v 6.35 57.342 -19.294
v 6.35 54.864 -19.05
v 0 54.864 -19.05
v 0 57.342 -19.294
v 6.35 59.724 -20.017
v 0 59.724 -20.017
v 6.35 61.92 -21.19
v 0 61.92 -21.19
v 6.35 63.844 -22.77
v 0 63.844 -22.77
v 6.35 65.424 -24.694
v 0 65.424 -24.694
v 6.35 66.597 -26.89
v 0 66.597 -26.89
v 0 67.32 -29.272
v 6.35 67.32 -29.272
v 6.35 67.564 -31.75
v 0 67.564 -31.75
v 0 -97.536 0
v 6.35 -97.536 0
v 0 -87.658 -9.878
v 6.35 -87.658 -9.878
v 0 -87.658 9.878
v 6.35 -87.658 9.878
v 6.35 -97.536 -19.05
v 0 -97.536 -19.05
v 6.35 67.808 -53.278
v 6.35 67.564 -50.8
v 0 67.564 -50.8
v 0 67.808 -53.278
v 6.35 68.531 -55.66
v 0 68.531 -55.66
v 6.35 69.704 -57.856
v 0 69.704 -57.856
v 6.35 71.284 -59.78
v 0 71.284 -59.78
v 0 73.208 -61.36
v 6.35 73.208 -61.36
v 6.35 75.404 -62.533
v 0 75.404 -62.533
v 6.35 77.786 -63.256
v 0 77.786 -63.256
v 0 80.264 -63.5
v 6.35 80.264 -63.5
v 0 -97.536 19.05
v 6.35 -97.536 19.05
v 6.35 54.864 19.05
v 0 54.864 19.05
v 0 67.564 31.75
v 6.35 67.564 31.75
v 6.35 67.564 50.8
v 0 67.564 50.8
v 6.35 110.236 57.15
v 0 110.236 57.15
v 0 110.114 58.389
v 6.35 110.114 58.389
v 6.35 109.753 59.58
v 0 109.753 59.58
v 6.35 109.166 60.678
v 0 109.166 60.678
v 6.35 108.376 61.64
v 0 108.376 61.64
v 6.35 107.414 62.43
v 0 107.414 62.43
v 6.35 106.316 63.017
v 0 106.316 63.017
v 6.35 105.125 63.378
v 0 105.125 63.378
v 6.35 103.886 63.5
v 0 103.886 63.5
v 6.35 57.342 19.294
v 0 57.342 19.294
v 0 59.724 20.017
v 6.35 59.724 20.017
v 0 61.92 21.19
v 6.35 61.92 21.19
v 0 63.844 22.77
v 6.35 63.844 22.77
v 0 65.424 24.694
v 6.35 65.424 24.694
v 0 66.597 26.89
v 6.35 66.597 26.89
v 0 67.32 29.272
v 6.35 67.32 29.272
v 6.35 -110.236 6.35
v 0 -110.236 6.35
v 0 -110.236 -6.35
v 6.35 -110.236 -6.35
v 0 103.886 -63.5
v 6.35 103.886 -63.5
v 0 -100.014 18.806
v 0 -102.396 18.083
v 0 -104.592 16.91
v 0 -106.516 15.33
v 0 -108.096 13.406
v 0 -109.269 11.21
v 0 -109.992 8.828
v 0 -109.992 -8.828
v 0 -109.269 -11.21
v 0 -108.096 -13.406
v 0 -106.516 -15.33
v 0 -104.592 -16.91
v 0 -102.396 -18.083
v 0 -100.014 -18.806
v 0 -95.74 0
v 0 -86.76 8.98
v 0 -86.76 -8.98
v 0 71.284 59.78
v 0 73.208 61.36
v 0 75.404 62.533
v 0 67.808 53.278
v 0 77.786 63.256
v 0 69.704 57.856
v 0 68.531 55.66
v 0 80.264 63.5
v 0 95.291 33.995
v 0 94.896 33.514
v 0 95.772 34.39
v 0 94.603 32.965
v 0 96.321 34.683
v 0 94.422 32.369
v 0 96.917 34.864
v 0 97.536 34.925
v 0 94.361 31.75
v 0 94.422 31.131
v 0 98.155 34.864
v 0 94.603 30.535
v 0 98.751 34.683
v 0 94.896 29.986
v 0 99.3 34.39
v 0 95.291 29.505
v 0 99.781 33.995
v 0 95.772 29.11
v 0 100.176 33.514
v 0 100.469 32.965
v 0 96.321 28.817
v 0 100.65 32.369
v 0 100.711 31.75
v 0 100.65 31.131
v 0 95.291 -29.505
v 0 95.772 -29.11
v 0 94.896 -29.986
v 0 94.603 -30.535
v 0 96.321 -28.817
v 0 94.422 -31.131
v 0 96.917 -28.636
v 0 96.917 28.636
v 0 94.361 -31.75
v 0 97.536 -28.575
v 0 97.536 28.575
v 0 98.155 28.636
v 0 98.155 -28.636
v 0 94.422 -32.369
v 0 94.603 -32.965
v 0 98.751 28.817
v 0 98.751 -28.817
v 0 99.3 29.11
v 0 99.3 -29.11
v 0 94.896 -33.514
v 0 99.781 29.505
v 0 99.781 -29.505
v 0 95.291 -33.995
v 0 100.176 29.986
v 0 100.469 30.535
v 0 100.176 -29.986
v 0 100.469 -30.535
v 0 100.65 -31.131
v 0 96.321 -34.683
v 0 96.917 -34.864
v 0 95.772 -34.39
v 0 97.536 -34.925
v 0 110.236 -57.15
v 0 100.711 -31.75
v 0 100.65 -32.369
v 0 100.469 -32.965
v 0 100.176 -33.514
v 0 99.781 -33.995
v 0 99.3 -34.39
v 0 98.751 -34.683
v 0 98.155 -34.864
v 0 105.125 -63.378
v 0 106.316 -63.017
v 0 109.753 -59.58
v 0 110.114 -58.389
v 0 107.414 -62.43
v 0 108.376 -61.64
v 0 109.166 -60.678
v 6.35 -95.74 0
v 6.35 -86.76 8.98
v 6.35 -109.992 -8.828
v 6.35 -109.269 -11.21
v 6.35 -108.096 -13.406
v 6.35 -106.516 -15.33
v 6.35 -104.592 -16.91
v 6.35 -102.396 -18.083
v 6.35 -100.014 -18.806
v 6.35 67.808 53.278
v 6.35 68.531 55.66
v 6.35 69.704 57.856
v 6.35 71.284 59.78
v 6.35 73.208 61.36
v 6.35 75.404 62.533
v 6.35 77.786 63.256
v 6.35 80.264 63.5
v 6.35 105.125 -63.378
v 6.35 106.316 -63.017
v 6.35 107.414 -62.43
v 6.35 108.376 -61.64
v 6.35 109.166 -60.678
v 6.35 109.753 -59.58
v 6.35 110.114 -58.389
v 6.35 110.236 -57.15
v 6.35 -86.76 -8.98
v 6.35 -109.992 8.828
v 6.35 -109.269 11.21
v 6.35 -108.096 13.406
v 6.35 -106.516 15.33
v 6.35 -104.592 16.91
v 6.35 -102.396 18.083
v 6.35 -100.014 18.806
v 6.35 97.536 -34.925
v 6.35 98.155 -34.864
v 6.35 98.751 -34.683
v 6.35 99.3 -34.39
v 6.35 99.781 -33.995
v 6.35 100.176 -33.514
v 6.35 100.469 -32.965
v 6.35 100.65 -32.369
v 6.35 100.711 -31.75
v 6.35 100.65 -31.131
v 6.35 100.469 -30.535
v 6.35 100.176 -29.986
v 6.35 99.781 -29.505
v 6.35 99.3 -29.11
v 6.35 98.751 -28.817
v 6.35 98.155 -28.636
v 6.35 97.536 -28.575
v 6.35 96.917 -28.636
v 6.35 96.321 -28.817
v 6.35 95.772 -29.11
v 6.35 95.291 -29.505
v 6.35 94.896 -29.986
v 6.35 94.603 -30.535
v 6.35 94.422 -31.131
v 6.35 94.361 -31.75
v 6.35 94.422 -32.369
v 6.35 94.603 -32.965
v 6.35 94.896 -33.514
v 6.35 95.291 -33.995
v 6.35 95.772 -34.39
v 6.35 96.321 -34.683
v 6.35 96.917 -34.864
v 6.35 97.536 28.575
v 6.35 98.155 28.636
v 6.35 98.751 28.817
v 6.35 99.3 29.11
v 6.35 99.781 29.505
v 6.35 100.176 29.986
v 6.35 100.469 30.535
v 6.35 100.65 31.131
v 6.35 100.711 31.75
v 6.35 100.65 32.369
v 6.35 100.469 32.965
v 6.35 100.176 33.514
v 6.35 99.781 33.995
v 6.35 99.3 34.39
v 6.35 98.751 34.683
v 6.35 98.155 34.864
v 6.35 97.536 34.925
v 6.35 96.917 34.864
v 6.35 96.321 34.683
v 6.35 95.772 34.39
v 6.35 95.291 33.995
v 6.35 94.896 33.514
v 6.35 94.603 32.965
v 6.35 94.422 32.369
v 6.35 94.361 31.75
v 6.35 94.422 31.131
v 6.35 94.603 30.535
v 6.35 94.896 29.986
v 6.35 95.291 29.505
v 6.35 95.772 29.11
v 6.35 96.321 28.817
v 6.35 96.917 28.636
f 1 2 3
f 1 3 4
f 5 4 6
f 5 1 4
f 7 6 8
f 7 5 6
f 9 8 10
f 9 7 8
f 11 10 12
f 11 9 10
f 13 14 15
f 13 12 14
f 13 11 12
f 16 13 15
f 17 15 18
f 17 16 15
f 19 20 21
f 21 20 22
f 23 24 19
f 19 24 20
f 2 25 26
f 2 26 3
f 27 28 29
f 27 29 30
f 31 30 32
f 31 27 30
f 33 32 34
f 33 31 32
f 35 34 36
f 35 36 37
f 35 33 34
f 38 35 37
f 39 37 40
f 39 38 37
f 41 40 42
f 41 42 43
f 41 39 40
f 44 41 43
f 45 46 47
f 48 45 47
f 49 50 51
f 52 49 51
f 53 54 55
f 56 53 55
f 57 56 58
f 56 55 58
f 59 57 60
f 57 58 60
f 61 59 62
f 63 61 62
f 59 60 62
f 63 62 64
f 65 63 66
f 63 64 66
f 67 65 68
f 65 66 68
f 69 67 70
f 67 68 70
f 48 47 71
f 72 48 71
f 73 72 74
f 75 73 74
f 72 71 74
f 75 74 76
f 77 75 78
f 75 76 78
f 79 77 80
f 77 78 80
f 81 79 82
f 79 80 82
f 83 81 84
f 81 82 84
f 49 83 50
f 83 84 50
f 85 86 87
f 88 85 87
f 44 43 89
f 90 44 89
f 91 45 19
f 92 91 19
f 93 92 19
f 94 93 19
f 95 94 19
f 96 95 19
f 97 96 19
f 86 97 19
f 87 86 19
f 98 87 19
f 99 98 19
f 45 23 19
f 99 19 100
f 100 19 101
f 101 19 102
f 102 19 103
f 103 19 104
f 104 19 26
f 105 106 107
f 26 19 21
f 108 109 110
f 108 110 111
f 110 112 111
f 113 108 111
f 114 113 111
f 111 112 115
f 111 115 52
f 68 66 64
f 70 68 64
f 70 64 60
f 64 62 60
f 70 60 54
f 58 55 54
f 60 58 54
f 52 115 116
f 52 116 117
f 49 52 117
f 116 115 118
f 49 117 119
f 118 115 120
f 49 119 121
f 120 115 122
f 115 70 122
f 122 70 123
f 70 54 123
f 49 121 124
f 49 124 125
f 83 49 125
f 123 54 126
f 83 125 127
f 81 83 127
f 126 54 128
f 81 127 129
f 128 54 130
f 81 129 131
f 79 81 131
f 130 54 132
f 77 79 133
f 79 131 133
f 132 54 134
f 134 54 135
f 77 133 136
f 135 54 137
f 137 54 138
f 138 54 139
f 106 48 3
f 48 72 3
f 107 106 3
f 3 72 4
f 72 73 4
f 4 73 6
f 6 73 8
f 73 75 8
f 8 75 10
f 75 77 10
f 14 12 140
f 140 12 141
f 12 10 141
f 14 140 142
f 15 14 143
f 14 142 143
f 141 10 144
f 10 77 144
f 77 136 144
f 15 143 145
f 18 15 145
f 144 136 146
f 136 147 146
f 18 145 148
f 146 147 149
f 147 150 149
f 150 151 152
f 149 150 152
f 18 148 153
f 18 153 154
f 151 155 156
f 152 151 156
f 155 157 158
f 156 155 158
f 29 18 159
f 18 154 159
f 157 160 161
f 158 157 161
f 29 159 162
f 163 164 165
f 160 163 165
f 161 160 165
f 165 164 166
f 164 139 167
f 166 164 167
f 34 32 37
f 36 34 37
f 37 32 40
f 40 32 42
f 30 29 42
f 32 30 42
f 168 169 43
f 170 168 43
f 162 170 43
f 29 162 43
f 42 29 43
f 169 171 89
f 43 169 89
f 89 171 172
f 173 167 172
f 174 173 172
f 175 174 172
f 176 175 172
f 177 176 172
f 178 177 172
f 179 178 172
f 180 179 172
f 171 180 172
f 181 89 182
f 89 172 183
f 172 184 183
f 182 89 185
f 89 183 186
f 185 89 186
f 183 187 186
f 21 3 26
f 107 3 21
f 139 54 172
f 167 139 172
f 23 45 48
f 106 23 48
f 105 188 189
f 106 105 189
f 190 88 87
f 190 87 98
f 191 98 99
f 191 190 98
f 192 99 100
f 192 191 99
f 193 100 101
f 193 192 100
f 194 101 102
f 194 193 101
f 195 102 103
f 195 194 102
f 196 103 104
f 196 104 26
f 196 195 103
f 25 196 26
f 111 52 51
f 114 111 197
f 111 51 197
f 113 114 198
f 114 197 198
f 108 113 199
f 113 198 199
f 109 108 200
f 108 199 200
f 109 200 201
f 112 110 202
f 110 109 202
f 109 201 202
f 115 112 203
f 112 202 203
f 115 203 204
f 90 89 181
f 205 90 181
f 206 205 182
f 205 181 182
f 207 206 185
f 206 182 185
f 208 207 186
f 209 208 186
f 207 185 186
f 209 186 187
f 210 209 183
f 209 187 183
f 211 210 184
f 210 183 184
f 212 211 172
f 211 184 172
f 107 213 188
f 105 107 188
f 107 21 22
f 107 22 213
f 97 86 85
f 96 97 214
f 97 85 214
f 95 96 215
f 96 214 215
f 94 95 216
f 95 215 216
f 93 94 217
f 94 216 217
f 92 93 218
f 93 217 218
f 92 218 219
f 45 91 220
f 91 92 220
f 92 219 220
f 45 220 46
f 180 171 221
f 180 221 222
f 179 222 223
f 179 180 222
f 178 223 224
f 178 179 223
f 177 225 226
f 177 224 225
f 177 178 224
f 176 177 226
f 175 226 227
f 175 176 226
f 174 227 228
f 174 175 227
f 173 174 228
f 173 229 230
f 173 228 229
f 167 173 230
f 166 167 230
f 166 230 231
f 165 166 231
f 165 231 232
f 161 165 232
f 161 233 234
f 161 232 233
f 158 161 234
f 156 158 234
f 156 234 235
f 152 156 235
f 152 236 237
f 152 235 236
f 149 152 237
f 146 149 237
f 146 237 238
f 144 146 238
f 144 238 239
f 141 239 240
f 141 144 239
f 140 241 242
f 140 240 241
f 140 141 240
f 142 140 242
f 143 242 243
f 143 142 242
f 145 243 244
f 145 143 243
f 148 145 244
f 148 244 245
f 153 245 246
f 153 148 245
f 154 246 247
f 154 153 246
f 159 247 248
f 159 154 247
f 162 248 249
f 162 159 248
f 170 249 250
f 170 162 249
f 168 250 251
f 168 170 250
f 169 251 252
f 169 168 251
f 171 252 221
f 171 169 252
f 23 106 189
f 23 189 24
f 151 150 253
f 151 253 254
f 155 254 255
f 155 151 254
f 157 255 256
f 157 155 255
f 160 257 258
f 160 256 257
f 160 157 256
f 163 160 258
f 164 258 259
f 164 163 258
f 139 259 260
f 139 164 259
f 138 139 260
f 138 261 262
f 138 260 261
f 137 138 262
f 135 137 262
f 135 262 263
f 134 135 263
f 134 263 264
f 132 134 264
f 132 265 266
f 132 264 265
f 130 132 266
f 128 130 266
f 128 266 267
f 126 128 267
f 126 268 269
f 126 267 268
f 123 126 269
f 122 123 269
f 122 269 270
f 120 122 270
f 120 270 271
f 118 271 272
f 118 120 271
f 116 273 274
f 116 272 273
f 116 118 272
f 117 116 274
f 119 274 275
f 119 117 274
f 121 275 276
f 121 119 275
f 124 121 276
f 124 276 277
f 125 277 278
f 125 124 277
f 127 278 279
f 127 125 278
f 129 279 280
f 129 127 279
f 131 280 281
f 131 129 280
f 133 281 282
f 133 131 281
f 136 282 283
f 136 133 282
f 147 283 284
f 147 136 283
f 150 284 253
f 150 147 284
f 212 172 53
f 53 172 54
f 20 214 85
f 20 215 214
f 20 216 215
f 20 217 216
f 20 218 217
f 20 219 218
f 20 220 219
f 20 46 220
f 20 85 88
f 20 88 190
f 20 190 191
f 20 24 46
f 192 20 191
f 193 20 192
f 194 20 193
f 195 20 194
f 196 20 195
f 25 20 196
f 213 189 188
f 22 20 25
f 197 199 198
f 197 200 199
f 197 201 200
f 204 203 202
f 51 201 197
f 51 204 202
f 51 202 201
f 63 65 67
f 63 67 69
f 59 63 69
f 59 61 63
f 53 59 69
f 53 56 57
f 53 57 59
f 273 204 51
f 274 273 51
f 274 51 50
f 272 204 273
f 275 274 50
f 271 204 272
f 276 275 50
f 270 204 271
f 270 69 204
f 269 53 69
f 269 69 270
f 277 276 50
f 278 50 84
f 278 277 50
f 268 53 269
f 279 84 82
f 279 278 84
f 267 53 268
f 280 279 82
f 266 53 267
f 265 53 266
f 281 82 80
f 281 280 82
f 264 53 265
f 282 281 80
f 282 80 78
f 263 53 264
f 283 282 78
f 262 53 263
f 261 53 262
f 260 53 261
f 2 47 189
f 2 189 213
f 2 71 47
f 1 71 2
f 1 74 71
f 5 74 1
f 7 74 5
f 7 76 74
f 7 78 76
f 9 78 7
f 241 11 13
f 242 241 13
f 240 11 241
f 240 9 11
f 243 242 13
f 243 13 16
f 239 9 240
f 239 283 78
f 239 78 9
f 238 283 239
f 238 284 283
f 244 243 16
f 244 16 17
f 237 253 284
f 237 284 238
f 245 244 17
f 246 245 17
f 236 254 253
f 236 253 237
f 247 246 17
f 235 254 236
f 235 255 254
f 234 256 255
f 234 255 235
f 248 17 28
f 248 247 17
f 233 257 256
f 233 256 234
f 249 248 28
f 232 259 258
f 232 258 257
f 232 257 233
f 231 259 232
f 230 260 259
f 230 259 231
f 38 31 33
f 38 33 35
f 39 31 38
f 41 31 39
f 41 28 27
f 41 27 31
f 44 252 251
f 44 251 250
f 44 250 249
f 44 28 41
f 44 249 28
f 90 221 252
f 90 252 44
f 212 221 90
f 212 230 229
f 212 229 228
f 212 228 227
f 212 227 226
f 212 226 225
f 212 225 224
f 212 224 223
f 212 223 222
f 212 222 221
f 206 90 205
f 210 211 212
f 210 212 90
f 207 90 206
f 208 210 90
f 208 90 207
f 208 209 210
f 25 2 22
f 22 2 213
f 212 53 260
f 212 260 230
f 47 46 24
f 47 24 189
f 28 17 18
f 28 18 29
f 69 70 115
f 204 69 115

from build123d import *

# Parameters (mm, degrees)
BOSS_EXTRUDE2_DEPTH     = 6.35
CUT_EXTRUDE1_REACH      = 129.376
CUT_EXTRUDE2_DEPTH      = 128.37561853
CUT_EXTRUDE2_DEPTH_BACK = 128.37561853
SKETCH5_R               = 3.175
CUT_EXTRUDE3_DEPTH      = 128.37561853


with BuildPart() as part:
    # Sketch3 → Boss-Extrude2 (new body)
    with BuildSketch(Plane(origin=(0, 0, 0), x_dir=(0, 0, -1), z_dir=(1, 0, 0))):
        with BuildLine():
            Line((-57.15, -110.236), (57.15, -110.236))
            ThreePointArc((57.15, -110.236), (61.640128061, -108.376128061), (63.5, -103.886))
            Line((63.5, -103.886), (63.5, 103.886))
            ThreePointArc((63.5, 103.886), (61.640128061, 108.376128061), (57.15, 110.236))
            Line((57.15, 110.236), (-57.15, 110.236))
            ThreePointArc((-57.15, 110.236), (-61.640128061, 108.376128061), (-63.5, 103.886))
            Line((-63.5, 103.886), (-63.5, -103.886))
            ThreePointArc((-63.5, -103.886), (-61.640128061, -108.376128061), (-57.15, -110.236))
        make_face()
    extrude(amount=BOSS_EXTRUDE2_DEPTH)

    # Sketch4 → Cut-Extrude1 (cut, up to next)
    with BuildSketch(Plane(origin=(6.35, 0, 0), x_dir=(0, 0, -1), z_dir=(1, 0, 0)), mode=Mode.PRIVATE) as cut_extrude1_sk1:
        Polygon((0, -95.739948776), (-8.980256121, -86.759692655), (-9.878281733, -87.657718267), (0, -97.536), (9.878281733, -87.657718267), (8.980256121, -86.759692655), align=None)
    cut_extrude1_tool1 = extrude(cut_extrude1_sk1.sketch, amount=-CUT_EXTRUDE1_REACH, mode=Mode.PRIVATE) & part.part
    add(cut_extrude1_tool1.solids().sort_by_distance((6.35, -91.408951, 4.649259))[0], mode=Mode.SUBTRACT)

    # Sketch5 → Cut-Extrude2 (cut, two sides: drawn at the far end of the back side and taken through both)
    with BuildSketch(Plane(origin=(6.35, 0, 0), x_dir=(0, 0, -1), z_dir=(1, 0, 0)).offset(-CUT_EXTRUDE2_DEPTH_BACK)):
        with Locations((-31.75, 97.536)):
            Circle(SKETCH5_R)
        with Locations((31.75, 97.536)):
            Circle(SKETCH5_R)
    extrude(amount=CUT_EXTRUDE2_DEPTH + CUT_EXTRUDE2_DEPTH_BACK, mode=Mode.SUBTRACT)

    # Sketch6 → Cut-Extrude3 (cut, through all)
    with BuildSketch(Plane(origin=(6.35, 0, 0), x_dir=(0, 0, -1), z_dir=(1, 0, 0))):
        with BuildLine():
            Line((-19.05, -97.536), (-19.05, 54.864))
            ThreePointArc((-19.05, 54.864), (-22.769743879, 63.844256121), (-31.75, 67.564))
            Line((-31.75, 67.564), (-50.8, 67.564))
            ThreePointArc((-50.8, 67.564), (-59.780256121, 71.283743879), (-63.5, 80.264))
            Line((-63.5, 80.264), (-63.5, 67.564))
            Line((-63.5, 67.564), (-63.5, -103.886))
            ThreePointArc((-63.5, -103.886), (-61.640128061, -108.376128061), (-57.15, -110.236))
            Line((-57.15, -110.236), (-19.05, -110.236))
            Line((-19.05, -110.236), (-6.35, -110.236))
            ThreePointArc((-6.35, -110.236), (-15.330256121, -106.516256121), (-19.05, -97.536))
        make_face()
        with BuildLine():
            Line((19.05, -97.536), (19.05, 54.864))
            ThreePointArc((19.05, 54.864), (22.769743879, 63.844256121), (31.75, 67.564))
            Line((31.75, 67.564), (50.8, 67.564))
            ThreePointArc((50.8, 67.564), (59.780256121, 71.283743879), (63.5, 80.264))
            Line((63.5, 80.264), (63.5, 67.564))
            Line((63.5, 67.564), (63.5, -103.886))
            ThreePointArc((63.5, -103.886), (61.640128061, -108.376128061), (57.15, -110.236))
            Line((57.15, -110.236), (19.05, -110.236))
            Line((19.05, -110.236), (6.35, -110.236))
            ThreePointArc((6.35, -110.236), (15.330256121, -106.516256121), (19.05, -97.536))
        make_face()
    extrude(amount=-CUT_EXTRUDE3_DEPTH, mode=Mode.SUBTRACT)


solid = part.part
